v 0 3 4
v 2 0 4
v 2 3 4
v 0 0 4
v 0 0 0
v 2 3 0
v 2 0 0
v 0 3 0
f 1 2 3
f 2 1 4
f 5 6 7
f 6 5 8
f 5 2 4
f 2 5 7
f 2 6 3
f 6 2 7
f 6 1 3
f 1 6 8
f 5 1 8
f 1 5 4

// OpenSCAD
// Start: lazy_union
default_5_default_5();
// End: lazy_union

// Modules.

// 'PartMaterial undef-default - undef-default'
module default_5_default_5() {
  // 'None : _combine_solids_and_holes'
  union() {
    // 'thing1'
    color(c=[1.0, 0.0, 0.0, 1.0]) {
      // 'thing1 : _combine_solids_and_holes'
      union() {
        // 'thing1'
        cube(size=[2.0, 3.0, 4.0]);
      }
    }
  }
} // end module default_5_default_5
